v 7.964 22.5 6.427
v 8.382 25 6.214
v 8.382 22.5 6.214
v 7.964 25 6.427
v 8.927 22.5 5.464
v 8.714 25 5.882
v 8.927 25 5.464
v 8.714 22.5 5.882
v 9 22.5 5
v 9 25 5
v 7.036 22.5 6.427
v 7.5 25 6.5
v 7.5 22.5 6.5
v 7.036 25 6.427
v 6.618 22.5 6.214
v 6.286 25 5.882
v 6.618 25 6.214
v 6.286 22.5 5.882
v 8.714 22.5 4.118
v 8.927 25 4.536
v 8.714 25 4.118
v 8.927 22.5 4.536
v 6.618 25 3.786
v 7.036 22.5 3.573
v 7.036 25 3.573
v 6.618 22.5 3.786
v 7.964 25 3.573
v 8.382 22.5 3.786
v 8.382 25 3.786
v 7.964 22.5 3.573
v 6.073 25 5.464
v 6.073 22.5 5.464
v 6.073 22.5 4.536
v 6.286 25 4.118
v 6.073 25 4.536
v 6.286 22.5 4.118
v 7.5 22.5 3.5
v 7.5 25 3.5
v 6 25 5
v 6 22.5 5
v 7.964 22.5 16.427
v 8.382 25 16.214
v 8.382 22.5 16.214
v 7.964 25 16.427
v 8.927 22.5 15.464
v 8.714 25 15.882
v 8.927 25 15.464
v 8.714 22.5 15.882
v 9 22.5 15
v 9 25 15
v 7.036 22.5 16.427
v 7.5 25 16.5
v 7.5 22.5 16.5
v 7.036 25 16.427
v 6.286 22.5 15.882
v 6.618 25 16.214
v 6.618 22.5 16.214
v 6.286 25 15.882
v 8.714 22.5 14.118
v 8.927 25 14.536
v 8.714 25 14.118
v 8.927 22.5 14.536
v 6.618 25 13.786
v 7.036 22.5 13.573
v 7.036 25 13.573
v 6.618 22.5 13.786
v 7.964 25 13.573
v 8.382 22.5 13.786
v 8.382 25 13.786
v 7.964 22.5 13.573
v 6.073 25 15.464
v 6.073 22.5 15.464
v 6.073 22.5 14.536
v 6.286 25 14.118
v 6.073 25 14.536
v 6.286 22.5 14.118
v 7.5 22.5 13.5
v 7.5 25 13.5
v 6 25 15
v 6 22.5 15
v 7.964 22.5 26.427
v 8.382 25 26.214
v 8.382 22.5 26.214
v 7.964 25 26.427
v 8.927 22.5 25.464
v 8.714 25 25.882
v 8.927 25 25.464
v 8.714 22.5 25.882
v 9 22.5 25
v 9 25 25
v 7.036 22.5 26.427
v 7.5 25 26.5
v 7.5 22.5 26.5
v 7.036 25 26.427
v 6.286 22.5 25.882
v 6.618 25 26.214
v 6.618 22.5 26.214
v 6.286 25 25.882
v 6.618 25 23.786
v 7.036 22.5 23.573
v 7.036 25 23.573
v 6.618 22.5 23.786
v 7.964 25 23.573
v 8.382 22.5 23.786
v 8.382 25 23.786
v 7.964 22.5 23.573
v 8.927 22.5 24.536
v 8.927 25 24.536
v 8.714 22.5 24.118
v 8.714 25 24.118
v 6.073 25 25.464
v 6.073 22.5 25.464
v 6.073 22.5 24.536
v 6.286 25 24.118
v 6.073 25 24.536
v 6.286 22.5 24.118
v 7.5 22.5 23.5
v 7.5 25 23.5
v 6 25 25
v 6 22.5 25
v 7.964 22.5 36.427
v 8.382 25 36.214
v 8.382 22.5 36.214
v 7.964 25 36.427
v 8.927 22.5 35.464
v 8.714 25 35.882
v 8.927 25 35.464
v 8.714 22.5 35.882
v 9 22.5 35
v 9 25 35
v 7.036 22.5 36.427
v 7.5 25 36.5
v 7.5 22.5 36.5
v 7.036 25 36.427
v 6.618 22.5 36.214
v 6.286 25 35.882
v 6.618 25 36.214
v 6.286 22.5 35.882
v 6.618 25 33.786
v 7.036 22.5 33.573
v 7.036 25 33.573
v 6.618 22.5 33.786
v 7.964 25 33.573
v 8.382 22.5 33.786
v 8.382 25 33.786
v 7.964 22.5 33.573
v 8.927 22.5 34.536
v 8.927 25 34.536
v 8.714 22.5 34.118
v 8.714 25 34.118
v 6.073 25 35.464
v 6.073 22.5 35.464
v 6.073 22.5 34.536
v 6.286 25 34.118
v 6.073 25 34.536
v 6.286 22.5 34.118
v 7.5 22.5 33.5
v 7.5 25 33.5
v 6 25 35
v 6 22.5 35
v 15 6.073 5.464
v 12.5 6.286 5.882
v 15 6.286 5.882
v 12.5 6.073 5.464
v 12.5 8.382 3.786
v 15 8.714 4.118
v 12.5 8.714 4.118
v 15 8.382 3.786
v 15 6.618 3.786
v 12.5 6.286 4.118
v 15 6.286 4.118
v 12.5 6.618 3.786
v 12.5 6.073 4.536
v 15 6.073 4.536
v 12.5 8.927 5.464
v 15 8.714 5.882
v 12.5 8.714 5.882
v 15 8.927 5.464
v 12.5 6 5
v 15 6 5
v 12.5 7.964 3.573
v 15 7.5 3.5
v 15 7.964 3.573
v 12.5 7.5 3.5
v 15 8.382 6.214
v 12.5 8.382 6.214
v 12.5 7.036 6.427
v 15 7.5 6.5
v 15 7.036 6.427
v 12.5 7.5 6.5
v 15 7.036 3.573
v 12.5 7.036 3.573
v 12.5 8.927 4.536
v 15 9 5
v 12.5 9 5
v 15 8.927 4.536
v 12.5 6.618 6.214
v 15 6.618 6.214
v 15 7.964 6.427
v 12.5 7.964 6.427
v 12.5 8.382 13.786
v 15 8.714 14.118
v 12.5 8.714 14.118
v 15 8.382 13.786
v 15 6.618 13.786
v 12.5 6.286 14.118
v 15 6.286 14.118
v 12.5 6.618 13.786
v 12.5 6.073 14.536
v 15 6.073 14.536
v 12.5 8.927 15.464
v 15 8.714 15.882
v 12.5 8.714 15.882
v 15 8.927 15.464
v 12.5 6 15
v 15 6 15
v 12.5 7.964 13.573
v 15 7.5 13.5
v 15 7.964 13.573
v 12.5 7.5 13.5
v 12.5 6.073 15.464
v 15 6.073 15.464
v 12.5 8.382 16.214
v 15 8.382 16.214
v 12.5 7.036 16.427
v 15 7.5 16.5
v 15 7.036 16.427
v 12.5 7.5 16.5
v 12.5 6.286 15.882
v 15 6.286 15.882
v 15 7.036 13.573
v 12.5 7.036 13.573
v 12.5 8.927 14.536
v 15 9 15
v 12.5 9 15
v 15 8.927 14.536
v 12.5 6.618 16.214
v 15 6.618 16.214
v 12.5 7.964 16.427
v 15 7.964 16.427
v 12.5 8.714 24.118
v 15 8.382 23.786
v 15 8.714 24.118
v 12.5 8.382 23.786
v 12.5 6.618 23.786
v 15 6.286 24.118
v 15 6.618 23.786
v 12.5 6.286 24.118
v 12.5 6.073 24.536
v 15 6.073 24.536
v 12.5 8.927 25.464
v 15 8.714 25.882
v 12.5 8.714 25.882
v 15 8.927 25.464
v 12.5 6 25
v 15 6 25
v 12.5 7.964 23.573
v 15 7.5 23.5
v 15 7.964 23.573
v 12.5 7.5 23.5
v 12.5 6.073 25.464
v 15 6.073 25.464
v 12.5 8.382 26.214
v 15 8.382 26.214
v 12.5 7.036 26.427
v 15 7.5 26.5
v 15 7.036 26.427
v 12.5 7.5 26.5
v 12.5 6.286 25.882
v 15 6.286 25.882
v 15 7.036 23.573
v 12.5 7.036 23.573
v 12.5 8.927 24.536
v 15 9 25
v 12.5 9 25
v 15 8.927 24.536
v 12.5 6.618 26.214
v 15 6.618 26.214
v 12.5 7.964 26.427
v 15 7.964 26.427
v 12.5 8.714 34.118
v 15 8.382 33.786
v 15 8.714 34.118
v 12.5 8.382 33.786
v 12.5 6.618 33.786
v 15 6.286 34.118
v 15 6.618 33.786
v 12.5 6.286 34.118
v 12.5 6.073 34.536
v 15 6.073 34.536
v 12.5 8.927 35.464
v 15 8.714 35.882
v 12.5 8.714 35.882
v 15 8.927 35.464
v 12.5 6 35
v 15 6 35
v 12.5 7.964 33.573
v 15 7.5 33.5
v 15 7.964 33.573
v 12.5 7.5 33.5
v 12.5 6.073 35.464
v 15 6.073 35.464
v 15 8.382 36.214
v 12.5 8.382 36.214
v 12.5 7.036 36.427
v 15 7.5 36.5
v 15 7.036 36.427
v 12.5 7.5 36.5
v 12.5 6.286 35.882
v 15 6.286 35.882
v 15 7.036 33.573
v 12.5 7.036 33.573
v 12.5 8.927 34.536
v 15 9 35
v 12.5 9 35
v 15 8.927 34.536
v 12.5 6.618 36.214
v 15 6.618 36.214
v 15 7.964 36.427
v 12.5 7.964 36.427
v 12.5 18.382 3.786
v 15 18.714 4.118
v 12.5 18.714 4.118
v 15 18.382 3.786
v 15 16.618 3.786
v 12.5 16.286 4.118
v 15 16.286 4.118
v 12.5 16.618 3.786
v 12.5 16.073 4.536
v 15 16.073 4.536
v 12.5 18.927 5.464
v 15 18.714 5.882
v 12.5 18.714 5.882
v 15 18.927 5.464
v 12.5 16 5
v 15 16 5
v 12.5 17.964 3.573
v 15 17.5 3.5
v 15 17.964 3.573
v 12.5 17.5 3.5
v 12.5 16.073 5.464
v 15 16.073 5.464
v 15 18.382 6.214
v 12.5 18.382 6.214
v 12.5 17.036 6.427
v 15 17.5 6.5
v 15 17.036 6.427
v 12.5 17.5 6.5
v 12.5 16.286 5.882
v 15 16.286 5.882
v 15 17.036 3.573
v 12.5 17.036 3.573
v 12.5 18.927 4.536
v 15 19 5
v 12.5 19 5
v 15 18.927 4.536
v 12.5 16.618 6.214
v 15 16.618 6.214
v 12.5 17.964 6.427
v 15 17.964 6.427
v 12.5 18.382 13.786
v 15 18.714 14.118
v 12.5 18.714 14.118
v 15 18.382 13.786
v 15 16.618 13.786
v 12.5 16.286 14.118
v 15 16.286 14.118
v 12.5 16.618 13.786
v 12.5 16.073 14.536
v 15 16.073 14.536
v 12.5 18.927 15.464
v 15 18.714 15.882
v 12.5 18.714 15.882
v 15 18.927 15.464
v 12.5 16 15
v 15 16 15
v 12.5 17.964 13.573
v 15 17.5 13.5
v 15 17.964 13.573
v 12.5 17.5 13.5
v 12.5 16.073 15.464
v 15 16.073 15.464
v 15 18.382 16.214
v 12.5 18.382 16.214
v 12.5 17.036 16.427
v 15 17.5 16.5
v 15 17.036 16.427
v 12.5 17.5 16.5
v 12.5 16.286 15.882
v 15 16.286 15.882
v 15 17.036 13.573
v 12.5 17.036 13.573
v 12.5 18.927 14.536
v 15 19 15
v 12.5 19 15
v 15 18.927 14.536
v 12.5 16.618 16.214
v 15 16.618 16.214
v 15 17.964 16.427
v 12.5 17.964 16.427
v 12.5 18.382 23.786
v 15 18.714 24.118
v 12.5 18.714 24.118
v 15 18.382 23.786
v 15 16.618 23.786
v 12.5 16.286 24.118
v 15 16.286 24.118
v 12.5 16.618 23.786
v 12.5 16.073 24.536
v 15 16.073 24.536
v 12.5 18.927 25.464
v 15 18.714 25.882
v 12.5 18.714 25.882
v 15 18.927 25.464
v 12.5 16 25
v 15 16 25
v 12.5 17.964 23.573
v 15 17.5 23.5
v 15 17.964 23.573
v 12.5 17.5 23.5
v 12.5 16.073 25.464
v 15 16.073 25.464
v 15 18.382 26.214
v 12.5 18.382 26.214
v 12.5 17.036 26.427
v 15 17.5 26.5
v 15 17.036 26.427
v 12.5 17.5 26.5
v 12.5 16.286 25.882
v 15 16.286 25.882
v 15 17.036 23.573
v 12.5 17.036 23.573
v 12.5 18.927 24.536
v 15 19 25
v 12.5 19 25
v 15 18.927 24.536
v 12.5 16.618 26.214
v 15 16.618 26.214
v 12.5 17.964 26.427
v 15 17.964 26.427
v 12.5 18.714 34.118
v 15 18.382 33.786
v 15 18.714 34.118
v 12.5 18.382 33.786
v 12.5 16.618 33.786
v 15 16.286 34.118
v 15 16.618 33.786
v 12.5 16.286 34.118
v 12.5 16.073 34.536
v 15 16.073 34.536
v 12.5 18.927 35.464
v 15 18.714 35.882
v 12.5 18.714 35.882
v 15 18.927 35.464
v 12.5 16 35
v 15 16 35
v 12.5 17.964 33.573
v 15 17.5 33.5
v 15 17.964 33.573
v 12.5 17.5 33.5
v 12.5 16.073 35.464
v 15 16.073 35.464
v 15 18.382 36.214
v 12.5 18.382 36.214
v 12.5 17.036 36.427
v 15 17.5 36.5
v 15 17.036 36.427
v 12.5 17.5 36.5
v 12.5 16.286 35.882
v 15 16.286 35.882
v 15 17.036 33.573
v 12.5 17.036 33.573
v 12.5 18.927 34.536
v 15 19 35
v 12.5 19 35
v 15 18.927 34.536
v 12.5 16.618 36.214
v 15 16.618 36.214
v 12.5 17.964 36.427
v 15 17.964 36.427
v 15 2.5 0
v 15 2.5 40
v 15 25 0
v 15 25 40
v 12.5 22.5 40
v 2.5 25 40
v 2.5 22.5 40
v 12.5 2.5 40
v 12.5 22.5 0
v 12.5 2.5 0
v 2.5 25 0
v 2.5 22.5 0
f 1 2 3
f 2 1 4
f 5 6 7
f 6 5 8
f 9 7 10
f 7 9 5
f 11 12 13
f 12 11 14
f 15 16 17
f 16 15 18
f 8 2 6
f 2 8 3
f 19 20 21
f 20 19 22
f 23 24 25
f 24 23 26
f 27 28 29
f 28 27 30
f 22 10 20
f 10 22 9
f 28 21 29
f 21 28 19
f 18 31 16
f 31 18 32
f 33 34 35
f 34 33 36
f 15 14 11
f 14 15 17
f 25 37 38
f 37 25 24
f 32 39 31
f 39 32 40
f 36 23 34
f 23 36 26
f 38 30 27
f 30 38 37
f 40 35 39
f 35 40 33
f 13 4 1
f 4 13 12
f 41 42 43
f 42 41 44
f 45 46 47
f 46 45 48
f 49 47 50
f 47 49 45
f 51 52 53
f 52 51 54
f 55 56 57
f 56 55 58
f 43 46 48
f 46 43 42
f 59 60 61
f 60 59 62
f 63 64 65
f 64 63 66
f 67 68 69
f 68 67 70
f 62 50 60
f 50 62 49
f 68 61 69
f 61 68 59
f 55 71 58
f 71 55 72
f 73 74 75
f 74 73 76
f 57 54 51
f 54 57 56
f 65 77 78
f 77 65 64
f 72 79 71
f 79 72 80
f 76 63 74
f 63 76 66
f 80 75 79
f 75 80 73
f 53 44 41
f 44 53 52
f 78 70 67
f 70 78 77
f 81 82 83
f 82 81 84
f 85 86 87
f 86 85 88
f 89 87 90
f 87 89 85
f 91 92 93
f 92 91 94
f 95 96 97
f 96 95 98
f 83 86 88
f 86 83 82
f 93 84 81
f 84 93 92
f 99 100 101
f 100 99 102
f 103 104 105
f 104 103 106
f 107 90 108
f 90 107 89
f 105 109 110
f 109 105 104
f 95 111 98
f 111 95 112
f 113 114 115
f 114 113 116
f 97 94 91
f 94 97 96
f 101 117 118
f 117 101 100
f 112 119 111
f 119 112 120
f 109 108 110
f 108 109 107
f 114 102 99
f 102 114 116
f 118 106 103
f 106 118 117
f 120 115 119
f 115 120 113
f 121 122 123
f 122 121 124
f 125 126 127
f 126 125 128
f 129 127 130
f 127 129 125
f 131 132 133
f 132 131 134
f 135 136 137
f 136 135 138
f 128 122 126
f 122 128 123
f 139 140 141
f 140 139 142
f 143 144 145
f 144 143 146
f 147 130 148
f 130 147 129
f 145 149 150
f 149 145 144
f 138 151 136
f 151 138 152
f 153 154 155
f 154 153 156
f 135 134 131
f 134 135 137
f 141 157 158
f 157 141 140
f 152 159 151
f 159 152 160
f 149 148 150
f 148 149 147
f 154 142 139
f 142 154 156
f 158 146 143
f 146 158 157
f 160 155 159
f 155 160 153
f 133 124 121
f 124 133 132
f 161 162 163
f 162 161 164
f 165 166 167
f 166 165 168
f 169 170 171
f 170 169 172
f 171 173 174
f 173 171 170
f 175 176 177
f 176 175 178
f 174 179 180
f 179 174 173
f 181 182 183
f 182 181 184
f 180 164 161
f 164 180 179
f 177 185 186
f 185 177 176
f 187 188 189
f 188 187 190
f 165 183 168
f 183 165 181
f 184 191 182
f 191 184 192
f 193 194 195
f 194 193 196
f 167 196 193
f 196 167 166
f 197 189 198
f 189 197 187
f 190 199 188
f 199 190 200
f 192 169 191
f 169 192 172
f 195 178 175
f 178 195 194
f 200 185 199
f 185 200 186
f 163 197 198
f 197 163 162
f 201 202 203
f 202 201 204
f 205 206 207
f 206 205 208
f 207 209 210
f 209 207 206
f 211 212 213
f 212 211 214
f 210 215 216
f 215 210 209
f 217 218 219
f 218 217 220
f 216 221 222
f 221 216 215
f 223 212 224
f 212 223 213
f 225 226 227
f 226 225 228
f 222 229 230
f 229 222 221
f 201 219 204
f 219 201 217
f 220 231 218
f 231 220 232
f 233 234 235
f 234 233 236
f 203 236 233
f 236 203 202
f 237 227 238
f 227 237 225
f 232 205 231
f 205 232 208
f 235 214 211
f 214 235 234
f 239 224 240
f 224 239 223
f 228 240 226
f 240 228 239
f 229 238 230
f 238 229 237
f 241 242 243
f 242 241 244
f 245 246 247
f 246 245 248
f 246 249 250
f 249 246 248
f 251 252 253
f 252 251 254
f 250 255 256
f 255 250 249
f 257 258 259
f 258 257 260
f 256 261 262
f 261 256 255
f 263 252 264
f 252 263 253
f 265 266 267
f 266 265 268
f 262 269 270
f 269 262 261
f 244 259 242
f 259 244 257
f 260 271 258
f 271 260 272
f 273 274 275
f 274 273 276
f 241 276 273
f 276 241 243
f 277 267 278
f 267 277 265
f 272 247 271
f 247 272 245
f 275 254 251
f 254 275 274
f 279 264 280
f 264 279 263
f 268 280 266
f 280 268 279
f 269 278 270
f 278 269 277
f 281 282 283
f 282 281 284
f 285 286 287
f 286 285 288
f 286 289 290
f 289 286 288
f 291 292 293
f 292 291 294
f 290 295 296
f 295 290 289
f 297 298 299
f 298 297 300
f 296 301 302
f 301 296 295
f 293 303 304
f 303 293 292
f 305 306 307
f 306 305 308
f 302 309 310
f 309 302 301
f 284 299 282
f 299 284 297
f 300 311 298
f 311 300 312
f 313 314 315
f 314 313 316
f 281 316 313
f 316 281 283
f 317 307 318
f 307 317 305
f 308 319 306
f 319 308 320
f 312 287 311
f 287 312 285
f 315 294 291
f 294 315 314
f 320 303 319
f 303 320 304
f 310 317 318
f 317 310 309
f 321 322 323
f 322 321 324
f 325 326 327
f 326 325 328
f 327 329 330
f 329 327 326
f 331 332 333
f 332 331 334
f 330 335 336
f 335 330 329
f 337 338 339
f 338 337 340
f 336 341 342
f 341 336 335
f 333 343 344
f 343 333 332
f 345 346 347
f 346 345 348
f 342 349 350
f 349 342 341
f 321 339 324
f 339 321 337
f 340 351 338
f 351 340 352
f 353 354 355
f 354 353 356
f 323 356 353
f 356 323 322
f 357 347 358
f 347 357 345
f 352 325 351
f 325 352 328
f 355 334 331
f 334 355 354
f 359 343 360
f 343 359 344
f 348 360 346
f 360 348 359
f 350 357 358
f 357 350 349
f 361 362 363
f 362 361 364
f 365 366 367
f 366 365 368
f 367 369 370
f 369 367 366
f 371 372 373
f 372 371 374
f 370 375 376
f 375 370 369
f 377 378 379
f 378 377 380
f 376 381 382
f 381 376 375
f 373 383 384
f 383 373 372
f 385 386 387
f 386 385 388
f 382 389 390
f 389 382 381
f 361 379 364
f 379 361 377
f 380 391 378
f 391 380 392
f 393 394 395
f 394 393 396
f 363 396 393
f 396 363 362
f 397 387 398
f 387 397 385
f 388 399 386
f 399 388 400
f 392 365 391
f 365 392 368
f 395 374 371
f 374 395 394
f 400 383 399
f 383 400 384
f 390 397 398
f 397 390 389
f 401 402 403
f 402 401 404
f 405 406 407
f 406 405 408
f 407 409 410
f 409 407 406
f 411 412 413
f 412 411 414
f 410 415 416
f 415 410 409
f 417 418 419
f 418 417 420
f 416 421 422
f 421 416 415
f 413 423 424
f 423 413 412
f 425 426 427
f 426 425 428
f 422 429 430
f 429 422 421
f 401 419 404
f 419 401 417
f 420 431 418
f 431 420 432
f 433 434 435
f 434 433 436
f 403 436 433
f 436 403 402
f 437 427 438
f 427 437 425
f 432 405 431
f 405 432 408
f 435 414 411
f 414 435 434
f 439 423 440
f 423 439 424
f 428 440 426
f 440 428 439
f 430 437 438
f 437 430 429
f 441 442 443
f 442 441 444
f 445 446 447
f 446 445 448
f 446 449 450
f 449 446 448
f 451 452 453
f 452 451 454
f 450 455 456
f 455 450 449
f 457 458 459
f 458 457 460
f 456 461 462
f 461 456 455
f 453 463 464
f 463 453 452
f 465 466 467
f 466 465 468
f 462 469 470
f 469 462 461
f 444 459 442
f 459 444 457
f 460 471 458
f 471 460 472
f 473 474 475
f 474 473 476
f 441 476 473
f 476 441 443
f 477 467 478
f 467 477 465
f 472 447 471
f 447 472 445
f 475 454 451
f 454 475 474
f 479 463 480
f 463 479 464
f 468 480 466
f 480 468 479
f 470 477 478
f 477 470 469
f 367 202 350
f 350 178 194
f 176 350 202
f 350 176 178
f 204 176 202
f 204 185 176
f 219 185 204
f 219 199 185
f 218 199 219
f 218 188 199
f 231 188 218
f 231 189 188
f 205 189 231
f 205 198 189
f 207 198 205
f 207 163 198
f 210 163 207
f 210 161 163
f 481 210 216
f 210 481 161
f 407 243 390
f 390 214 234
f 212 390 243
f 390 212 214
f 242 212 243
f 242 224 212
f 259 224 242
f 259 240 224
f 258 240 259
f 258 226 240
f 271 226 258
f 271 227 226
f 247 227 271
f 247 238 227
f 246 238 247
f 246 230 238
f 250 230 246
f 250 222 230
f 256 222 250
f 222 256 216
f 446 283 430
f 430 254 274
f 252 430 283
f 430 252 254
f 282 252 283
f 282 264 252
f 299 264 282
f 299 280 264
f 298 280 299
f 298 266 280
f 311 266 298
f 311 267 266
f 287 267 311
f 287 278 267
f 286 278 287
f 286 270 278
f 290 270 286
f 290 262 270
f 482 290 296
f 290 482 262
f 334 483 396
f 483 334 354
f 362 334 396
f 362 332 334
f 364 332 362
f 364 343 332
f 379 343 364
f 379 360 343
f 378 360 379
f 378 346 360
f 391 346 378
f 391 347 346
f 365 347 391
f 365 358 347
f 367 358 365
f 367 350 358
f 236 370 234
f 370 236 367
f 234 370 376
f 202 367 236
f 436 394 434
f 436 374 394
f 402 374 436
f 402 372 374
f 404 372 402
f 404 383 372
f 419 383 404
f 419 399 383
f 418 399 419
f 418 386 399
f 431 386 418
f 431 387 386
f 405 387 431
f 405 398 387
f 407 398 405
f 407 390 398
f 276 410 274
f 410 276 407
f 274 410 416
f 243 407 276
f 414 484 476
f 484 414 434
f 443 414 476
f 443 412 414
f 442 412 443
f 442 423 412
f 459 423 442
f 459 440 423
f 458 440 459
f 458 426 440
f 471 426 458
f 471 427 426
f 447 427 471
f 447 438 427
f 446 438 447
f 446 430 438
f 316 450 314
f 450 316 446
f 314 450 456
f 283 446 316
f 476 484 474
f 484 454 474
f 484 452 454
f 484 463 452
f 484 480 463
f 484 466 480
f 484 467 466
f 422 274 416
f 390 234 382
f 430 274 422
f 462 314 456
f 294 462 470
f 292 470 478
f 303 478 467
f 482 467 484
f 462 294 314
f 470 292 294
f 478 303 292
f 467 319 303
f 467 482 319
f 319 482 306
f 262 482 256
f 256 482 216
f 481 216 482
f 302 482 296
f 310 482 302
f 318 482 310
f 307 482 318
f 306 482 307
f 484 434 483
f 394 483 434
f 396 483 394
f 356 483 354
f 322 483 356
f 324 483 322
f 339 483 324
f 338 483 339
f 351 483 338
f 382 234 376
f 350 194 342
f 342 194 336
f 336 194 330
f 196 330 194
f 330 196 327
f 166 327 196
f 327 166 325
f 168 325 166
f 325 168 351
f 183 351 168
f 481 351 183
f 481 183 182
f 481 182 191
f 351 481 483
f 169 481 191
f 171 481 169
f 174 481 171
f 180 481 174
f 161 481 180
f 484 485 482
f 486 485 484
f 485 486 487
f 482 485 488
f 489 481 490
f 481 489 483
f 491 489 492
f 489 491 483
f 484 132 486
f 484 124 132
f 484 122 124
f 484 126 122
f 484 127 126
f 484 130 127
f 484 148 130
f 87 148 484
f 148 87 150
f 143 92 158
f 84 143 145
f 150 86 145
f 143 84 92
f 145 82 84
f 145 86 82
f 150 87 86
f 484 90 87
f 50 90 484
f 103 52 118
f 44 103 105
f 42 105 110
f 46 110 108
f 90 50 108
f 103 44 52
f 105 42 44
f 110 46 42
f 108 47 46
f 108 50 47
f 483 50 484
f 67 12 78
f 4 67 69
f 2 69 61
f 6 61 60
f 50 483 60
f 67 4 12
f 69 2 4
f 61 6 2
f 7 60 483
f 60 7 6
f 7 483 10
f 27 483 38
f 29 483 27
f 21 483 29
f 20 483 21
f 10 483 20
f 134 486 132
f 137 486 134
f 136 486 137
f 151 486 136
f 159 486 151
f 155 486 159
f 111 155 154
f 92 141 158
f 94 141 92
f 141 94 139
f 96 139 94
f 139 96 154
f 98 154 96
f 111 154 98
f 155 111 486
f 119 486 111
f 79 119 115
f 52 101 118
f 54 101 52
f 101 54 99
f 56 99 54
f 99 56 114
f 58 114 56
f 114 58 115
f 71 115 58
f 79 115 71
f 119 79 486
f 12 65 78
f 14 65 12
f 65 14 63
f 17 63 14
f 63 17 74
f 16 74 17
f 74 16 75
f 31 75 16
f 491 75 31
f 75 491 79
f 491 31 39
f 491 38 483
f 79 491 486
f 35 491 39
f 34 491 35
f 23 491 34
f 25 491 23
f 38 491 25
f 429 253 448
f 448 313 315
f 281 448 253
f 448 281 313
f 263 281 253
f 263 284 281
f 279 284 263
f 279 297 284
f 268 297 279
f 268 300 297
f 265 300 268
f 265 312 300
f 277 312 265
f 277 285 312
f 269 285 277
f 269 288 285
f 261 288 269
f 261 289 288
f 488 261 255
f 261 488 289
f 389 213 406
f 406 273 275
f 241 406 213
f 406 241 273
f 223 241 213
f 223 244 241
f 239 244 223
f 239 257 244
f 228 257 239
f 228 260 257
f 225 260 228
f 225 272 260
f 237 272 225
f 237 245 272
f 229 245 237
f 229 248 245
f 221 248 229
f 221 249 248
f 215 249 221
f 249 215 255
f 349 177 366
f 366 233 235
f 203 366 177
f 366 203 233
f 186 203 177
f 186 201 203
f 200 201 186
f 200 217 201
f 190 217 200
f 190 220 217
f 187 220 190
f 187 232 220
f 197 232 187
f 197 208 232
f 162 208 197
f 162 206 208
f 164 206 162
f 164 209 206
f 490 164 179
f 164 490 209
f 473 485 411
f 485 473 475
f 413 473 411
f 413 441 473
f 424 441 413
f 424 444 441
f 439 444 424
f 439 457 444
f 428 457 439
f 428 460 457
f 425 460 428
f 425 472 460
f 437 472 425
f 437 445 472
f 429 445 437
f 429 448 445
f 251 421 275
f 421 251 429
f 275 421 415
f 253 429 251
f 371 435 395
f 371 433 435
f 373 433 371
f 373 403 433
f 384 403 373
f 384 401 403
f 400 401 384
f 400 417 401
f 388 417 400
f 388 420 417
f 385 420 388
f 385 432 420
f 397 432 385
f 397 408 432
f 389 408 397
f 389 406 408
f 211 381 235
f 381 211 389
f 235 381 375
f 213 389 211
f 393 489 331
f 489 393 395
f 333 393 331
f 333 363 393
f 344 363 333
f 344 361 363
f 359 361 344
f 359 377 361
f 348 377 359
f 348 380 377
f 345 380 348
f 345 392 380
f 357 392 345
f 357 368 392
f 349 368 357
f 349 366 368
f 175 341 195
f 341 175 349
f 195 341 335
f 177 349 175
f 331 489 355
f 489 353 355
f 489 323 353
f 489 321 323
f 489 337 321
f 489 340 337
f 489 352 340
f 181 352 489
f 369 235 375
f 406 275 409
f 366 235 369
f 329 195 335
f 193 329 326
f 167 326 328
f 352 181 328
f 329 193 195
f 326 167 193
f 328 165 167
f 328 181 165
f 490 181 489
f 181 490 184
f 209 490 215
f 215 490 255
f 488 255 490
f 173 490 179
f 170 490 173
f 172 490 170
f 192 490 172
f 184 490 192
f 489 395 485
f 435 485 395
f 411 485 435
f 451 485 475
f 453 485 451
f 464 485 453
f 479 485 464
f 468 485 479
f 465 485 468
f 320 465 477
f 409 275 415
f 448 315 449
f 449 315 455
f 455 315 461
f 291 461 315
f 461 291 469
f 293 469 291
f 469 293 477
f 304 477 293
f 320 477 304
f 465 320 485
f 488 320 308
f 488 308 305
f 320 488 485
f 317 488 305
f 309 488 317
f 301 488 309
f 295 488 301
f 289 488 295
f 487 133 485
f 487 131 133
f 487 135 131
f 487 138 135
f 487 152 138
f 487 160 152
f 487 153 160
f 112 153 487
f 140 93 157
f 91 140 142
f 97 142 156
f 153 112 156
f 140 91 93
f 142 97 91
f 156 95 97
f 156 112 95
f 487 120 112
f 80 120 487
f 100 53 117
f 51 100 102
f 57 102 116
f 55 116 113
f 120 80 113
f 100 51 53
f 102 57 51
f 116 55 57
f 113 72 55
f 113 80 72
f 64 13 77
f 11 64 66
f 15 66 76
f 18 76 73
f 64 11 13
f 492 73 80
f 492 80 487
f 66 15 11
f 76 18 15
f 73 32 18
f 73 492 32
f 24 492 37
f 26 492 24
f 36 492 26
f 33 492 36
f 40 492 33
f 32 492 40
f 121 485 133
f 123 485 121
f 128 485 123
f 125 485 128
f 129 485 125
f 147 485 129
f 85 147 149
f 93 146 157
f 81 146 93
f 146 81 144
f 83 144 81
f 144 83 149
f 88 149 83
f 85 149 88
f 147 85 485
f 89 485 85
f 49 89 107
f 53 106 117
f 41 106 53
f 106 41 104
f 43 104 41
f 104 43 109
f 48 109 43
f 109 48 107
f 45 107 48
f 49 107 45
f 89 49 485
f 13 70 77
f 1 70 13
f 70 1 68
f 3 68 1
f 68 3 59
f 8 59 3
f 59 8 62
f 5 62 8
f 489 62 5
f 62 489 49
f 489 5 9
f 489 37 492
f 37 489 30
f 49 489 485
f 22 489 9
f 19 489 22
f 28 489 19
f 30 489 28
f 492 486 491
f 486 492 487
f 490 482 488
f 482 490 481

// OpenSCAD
/*
 
  _   _ ____  ____  ____  _       _                         
 | | | |  _ \|  _ \/ ___|| | __ _| |__   ___ ___  _ __ ___  
 | | | | |_) | |_) \___ \| |/ _` | '_ \ / __/ _ \| '_ ` _ \ 
 | |_| |  __/|  __/ ___) | | (_| | |_) | (_| (_) | | | | | |
  \___/|_|   |_|   |____/|_|\__,_|_.__(_)___\___/|_| |_| |_|
                                                            
          Home of the Universal Printed Part System 

Partform path:          M3_structure_shell_v
Version:                1.0.0
Version notes:          Initial partform with core geometry only. Non-optimized.
Monikers:               "vee" "vee channel" "plain vee" 
contributors:           Alex Penney
*/

// BEGIN OPTIONS- edit these values to generate different parts of this form.

N = 1; //whole number of 10mm units along the X axis
M = 2; //whole number of 10mm units along the Y axis
H = 4; //whole number of 10mm units along the Z axis.

THICKNESS = 2.5; //Nominal 2.5mm - thickness of the two "walls" of the part

HOLE_DIAMETER = 3.0; //Nominal 3.0mm - common diameter of holes throughout

HOLE_FACES = 20; //Default 20 - higher number => slower render, smoother holes

// END OPTIONS- edit what follows at your own risk

width = 10*N + 2*THICKNESS;
length = 10*M + 2*THICKNESS;
tall = 10*H;



difference(){
    cube([width,length,tall]);
    
    translate([0,0,-1]){
        cube([10*N + THICKNESS,10*M + THICKNESS,tall*3],center=false);
    }
    
    for(i = [0:N-1]){
        for(k = [0:H-1]){
            translate([THICKNESS+5+i*10,0,5+k*10]){
                rotate(90,[1,0,0]){
                    cylinder(h = length*4, d = HOLE_DIAMETER,center = true,$fn = HOLE_FACES);
                }
            }
        }
    }
    
    for(j = [0:M-1]){
        for(k = [0:H-1]){
            translate([0,THICKNESS+5+j*10,5+k*10]){
                rotate(90,[0,1,0]){
                    cylinder(h=width*4,d=HOLE_DIAMETER,center=true,$fn=HOLE_FACES);
                }
            }
        }
    }
    translate([-1,-1,-1]){
        cube([THICKNESS+1,length+2,tall+2]);
    }
    translate([-1,-1,-1]){
        cube([width+2,THICKNESS+1,tall+2]);
    }
    
}
